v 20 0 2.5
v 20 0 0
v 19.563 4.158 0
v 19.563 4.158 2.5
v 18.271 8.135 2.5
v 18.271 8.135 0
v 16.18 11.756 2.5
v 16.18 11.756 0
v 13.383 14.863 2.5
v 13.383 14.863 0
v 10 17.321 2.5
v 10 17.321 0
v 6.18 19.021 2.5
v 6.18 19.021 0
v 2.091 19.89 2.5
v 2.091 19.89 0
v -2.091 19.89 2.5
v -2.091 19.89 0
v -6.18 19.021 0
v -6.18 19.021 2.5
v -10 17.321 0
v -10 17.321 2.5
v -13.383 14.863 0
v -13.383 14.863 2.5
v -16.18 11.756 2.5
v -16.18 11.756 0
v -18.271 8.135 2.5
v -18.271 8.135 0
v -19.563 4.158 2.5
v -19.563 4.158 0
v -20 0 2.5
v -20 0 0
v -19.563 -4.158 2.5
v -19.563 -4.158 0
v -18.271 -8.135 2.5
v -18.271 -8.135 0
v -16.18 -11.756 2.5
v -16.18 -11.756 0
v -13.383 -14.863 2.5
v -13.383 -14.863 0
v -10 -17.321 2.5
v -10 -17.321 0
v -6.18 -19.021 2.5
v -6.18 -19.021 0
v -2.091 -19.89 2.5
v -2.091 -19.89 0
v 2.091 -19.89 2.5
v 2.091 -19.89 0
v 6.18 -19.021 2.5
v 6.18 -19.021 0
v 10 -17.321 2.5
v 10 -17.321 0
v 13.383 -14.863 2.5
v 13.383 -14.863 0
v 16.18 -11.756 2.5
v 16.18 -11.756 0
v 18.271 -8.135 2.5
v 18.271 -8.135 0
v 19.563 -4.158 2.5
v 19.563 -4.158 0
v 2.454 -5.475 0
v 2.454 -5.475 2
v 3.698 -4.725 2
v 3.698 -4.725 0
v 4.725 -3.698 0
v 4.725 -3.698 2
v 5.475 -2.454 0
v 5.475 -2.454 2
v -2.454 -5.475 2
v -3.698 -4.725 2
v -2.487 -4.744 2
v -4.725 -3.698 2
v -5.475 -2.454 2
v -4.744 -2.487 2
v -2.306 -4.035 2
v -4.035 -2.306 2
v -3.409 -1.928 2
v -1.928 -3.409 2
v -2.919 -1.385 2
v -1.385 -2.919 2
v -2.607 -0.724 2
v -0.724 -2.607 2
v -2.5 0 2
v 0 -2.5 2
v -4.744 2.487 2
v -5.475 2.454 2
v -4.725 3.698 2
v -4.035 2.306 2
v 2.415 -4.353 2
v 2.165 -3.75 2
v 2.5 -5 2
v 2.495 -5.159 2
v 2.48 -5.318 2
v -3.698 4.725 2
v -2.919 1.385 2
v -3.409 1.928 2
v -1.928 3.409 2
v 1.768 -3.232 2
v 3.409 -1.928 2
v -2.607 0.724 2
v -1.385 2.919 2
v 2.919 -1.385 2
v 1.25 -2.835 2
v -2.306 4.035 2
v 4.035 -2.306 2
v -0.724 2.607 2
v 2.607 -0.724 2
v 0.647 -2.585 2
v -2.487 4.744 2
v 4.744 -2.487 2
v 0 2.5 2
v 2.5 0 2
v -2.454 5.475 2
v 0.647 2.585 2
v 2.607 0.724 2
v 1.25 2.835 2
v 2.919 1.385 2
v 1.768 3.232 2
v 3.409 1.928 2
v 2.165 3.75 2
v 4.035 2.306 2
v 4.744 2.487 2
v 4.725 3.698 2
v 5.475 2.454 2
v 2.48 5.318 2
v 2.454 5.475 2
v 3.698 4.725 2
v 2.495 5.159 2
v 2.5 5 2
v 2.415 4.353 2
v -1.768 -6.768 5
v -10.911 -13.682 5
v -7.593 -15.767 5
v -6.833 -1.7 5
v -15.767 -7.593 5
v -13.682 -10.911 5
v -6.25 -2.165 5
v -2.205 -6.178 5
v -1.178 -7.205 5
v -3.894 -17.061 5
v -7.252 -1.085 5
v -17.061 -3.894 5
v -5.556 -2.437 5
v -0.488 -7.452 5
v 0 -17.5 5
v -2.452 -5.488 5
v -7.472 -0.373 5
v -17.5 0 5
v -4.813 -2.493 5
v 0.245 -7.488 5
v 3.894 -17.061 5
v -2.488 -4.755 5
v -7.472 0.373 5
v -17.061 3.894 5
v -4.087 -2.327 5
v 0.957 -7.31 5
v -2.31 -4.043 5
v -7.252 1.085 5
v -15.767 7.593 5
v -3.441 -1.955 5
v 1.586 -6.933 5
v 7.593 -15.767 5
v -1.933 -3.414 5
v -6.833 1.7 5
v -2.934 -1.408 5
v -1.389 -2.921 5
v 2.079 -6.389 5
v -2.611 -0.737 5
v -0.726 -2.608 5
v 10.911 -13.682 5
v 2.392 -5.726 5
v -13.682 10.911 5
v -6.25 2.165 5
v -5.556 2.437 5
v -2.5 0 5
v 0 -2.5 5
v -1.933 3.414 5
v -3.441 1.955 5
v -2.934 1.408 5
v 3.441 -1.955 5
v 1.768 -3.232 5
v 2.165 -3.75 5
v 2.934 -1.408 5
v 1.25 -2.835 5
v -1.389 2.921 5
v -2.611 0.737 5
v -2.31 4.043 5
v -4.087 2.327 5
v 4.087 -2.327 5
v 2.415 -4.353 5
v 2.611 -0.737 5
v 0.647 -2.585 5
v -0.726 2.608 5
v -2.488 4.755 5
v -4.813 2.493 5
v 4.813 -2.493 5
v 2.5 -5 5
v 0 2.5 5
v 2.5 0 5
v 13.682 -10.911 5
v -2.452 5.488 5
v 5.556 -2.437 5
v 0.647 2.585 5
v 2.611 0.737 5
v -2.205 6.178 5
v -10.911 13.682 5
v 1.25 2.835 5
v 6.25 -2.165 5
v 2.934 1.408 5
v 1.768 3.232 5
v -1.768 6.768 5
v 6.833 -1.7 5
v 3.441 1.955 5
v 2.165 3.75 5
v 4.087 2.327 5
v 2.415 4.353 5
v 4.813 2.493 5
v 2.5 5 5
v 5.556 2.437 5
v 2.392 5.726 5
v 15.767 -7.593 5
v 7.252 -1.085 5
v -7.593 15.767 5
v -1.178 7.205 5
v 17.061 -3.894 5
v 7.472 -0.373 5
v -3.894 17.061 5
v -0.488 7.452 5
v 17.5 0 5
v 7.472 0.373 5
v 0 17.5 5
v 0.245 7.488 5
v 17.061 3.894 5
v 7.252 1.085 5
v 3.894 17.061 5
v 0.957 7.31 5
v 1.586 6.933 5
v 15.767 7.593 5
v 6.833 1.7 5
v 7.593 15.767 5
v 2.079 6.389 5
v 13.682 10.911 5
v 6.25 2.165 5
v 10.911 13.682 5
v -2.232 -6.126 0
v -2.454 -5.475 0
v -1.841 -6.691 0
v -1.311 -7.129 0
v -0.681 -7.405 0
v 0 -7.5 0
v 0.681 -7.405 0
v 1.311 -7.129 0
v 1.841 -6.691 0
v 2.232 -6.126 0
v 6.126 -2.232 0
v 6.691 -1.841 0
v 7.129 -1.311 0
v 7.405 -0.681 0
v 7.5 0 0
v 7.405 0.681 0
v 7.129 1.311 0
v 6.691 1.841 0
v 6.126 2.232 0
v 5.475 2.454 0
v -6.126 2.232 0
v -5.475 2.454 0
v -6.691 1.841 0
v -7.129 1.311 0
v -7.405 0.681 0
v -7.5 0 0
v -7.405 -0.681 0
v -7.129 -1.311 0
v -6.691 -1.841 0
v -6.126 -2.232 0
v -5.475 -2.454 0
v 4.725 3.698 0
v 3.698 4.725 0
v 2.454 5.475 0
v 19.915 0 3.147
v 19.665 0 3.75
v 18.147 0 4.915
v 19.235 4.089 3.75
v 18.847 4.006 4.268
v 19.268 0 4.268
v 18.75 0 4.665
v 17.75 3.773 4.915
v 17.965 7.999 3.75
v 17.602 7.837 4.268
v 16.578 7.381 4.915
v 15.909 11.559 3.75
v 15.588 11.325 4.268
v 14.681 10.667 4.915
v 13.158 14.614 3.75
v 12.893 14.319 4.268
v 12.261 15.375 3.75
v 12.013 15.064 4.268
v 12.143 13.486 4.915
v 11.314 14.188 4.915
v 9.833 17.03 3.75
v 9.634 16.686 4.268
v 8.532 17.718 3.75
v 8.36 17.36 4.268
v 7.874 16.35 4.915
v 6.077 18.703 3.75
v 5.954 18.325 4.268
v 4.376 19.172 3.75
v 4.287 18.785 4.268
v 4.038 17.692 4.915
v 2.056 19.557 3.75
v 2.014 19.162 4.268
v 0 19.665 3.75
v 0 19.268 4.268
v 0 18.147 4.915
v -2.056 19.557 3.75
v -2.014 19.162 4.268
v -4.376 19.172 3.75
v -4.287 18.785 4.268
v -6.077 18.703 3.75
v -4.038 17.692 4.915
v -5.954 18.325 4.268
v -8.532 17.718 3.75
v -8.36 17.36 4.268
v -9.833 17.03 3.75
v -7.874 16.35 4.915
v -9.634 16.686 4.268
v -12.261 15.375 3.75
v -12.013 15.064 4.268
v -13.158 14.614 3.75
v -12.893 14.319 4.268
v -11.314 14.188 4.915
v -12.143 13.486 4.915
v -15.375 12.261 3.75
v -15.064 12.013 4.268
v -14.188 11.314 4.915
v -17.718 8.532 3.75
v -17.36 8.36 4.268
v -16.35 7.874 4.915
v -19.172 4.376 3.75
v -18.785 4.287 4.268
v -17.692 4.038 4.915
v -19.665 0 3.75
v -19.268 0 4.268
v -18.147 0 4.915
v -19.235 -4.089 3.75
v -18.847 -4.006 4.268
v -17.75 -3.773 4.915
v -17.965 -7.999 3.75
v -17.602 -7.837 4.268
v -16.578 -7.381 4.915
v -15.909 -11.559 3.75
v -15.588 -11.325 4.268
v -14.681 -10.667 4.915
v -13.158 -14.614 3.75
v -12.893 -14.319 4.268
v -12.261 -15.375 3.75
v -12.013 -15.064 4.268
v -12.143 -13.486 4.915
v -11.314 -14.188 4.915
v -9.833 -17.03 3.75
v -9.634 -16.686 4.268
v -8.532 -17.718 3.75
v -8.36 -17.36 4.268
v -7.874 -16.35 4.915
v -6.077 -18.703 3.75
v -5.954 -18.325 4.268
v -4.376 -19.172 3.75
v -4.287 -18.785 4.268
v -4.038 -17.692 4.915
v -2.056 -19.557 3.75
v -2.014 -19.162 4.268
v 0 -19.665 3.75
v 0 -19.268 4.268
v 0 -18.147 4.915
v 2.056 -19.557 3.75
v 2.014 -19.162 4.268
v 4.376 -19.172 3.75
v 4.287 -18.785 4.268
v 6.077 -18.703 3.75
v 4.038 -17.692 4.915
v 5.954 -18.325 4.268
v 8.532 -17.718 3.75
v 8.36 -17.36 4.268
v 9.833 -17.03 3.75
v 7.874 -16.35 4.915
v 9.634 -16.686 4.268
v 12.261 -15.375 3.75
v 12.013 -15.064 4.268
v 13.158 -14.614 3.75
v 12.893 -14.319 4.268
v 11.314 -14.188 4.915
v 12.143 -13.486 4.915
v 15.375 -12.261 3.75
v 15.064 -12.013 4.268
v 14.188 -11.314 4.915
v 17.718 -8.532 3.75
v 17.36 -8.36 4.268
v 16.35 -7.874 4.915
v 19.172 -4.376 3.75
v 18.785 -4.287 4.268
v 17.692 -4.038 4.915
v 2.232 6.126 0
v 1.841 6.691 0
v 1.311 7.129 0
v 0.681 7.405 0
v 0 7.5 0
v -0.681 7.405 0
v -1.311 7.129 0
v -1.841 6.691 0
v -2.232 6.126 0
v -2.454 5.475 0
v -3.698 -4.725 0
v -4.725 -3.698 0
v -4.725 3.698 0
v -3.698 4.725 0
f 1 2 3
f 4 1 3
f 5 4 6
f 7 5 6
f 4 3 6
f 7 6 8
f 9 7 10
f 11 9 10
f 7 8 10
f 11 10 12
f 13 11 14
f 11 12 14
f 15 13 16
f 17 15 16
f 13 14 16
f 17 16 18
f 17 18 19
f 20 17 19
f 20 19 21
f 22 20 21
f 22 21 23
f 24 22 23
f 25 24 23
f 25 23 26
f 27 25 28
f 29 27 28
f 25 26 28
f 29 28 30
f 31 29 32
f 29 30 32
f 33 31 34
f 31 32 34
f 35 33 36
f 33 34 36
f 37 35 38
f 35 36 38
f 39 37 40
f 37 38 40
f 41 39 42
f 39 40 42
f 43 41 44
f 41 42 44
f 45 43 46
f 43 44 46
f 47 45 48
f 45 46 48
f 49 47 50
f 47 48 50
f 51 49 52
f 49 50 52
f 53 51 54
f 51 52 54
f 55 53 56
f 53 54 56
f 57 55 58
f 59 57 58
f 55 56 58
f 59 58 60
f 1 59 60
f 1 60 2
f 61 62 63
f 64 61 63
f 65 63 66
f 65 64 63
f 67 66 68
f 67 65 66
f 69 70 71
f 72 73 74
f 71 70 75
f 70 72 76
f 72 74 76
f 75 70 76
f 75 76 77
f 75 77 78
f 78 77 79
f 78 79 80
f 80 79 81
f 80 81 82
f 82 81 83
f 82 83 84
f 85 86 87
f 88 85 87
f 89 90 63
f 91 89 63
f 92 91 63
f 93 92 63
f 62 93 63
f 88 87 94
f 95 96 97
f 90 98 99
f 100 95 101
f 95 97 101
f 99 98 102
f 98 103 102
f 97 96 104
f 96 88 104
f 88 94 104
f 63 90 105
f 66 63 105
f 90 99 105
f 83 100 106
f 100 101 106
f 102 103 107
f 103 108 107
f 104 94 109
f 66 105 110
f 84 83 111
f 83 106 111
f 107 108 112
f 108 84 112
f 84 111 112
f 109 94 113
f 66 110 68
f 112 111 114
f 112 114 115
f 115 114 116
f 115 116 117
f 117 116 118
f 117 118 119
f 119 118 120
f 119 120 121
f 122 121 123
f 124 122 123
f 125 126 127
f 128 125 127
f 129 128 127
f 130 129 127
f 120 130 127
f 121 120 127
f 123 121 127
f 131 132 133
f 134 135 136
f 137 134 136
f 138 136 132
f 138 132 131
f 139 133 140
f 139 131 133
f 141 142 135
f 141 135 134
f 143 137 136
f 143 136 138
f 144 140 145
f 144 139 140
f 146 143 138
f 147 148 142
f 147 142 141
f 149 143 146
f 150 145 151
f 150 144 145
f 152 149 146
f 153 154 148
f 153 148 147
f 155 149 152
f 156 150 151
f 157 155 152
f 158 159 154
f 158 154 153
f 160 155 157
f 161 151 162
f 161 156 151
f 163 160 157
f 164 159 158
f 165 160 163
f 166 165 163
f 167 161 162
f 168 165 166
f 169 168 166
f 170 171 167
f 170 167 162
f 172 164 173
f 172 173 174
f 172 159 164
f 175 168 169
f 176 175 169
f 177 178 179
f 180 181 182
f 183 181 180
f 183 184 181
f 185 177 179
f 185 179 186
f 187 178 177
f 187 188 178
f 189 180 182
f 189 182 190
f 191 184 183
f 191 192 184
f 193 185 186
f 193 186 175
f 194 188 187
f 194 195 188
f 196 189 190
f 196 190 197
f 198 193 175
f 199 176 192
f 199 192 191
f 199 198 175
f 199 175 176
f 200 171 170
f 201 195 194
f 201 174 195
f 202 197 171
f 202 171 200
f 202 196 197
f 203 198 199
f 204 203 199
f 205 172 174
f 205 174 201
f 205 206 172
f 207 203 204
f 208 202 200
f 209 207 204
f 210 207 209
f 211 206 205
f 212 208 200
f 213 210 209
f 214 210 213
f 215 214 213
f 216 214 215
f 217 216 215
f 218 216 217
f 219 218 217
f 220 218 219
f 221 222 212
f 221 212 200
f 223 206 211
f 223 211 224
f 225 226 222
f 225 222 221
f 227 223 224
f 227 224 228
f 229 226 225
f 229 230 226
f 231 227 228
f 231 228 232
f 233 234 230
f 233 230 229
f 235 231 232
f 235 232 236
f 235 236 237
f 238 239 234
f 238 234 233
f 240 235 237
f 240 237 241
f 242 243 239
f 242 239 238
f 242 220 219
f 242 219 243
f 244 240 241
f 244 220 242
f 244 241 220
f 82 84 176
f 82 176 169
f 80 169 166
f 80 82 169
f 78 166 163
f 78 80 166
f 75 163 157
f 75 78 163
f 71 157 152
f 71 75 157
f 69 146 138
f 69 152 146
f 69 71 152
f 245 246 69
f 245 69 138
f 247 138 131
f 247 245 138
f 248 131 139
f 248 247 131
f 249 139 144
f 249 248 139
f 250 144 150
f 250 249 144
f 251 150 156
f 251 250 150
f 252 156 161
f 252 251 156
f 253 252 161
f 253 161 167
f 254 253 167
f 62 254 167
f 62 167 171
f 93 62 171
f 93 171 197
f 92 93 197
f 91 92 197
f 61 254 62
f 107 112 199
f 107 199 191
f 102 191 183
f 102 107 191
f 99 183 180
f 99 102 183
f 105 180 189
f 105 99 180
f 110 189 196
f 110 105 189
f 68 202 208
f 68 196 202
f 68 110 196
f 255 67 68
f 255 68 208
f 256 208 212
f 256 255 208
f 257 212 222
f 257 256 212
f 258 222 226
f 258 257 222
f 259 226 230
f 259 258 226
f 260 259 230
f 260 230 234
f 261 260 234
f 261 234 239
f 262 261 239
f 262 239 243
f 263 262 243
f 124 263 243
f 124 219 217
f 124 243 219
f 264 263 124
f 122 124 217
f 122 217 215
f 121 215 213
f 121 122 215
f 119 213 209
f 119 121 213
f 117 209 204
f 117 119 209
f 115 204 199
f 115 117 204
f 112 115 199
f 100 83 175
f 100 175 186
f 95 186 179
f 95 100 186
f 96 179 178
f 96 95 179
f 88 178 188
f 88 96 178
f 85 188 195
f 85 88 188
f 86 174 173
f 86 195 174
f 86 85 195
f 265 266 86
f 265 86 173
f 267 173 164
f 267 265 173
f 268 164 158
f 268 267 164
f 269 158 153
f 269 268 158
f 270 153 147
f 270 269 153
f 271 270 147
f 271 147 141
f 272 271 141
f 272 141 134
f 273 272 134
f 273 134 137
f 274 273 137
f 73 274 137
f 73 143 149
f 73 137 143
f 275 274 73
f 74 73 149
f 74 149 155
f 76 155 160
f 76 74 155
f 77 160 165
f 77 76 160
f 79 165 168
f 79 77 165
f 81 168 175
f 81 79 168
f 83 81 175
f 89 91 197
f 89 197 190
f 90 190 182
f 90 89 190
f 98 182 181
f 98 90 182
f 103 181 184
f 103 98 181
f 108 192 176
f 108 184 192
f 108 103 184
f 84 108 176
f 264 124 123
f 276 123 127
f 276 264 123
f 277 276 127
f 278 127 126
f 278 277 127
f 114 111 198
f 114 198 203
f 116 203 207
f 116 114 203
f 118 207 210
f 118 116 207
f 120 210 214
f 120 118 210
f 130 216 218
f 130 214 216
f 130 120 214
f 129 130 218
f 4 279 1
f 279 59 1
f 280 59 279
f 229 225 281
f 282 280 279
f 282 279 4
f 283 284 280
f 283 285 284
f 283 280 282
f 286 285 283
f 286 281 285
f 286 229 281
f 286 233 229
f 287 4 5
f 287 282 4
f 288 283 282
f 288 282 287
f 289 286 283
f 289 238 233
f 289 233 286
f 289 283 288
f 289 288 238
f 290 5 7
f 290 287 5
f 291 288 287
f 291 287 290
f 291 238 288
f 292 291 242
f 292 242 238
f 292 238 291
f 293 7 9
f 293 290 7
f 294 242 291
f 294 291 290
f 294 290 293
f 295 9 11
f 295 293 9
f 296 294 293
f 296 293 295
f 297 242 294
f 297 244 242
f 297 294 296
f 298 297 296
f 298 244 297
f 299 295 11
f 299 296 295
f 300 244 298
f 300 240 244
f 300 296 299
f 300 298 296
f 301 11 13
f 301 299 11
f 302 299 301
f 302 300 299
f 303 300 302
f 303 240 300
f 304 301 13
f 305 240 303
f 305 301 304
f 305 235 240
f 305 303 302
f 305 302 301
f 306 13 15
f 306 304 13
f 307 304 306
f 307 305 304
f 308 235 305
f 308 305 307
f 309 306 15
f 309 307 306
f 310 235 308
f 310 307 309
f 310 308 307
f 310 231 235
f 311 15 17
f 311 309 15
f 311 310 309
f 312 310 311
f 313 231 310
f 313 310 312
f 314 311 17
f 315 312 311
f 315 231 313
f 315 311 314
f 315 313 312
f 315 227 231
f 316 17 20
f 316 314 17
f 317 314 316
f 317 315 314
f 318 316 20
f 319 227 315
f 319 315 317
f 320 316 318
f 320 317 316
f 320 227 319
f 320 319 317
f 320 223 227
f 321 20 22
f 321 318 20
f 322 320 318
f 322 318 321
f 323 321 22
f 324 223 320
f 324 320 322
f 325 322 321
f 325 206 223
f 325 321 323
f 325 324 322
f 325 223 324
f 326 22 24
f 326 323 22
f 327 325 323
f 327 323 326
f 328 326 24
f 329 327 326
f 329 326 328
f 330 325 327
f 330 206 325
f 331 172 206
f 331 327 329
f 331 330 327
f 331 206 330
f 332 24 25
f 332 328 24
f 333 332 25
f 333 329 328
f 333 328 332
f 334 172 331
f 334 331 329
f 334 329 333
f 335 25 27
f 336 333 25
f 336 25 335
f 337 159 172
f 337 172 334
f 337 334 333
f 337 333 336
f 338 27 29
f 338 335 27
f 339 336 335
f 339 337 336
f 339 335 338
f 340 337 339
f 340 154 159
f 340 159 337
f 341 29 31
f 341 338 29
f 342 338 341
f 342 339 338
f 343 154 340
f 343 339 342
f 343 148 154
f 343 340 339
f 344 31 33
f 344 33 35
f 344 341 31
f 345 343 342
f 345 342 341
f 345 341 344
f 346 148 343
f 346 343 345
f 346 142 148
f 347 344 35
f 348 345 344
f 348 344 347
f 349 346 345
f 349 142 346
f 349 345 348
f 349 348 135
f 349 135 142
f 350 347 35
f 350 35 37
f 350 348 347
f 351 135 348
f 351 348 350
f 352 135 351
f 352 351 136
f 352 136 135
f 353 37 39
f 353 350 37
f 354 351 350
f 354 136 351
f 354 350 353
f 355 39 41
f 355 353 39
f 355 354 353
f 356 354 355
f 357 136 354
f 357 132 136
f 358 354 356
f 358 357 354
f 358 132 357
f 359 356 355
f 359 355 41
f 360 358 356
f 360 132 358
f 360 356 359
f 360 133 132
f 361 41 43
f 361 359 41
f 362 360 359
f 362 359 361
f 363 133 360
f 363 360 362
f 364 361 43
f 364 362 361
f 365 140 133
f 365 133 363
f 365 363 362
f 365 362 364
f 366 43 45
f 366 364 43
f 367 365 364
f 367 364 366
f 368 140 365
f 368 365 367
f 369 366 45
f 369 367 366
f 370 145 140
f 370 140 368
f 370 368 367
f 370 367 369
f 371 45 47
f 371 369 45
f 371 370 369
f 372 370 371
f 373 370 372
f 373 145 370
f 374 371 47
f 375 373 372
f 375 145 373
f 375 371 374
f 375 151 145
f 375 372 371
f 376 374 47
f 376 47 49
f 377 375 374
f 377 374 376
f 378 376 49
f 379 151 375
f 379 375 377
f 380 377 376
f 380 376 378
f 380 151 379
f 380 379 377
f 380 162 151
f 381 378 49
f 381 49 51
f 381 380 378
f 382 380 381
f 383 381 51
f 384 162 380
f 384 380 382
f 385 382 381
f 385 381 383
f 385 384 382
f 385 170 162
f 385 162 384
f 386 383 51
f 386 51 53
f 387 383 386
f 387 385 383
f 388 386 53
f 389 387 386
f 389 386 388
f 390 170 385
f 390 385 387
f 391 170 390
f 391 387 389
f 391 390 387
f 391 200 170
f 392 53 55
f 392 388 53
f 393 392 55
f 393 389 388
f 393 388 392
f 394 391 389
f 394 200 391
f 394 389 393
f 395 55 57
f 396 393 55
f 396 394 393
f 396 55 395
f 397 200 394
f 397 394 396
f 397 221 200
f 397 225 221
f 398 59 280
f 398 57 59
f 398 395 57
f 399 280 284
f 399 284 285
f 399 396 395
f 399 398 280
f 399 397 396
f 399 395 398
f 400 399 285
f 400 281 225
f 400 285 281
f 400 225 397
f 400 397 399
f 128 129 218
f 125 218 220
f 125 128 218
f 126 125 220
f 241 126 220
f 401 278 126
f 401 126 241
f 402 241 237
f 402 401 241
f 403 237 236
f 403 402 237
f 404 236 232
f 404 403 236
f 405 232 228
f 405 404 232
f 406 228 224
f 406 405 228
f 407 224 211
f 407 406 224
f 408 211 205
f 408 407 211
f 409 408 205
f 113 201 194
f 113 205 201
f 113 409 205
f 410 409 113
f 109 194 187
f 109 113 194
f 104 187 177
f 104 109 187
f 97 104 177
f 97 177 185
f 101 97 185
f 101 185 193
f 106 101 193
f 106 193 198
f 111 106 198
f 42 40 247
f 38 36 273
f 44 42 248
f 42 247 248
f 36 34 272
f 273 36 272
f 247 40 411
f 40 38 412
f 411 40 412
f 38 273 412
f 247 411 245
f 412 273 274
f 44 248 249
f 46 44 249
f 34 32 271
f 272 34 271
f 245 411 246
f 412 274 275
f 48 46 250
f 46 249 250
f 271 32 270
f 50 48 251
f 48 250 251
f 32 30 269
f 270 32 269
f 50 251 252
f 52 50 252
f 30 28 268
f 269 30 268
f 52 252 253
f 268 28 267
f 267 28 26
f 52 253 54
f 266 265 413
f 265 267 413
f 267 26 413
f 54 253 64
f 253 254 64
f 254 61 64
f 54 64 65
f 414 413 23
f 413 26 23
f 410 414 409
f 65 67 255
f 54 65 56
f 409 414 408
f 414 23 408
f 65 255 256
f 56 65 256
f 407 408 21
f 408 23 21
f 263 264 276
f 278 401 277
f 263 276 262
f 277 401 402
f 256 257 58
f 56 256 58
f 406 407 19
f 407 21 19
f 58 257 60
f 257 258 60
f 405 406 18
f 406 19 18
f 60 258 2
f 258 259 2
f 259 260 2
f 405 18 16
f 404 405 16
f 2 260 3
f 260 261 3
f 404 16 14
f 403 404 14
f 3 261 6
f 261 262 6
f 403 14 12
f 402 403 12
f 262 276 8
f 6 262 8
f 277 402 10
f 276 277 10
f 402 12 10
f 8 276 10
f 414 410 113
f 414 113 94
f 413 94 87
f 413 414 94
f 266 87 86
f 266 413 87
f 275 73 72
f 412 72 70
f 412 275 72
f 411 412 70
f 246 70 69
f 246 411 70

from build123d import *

# Parameters (mm, degrees)
F0_R     = 20
F1_DEPTH = 5
F2_R     = 2.5
F3_R     = 2.5
F4_DEPTH = 25
F5_R     = 6
F6_DEPTH = 2


# Not quite as in the source:
# - a feature names something its author has since deleted; it is built from what else it names


with BuildPart() as f1:
    # F0 (on Top) → F1 (new body)
    with BuildSketch(Plane.XY):
        Circle(F0_R)
    extrude(amount=F1_DEPTH)

    # F2
    f2_edges = [f1.edges().sort_by_distance(p)[0] for p in [
        (-20, 0, 5),
    ]]
    fillet(f2_edges, radius=F2_R)

    # F3 (on Top) → F4 (cut)
    with BuildSketch(Plane.XY):
        with BuildLine():
            ThreePointArc((2.5, 5), (-1.767766953, 6.767766953), (0, 2.5))
            ThreePointArc((0, 2.5), (1.767766953, 3.232233047), (2.5, 5))
        make_face()
        with Locations((-5, 0)):
            Circle(F3_R)
        with BuildLine():
            ThreePointArc((2.5, -5), (1.767766953, -3.232233047), (0, -2.5))
            ThreePointArc((0, -2.5), (-1.767766953, -6.767766953), (2.5, -5))
        make_face()
        with BuildLine():
            ThreePointArc((7.5, 0), (5, 2.5), (2.5, 0))
            ThreePointArc((2.5, 0), (5, -2.5), (7.5, 0))
        make_face()
    extrude(amount=F4_DEPTH, mode=Mode.SUBTRACT)

    # F5 (on Top) → F6 (cut)
    with BuildSketch(Plane.XY):
        Circle(F5_R)
    extrude(amount=F6_DEPTH, mode=Mode.SUBTRACT)


solid = f1.part
